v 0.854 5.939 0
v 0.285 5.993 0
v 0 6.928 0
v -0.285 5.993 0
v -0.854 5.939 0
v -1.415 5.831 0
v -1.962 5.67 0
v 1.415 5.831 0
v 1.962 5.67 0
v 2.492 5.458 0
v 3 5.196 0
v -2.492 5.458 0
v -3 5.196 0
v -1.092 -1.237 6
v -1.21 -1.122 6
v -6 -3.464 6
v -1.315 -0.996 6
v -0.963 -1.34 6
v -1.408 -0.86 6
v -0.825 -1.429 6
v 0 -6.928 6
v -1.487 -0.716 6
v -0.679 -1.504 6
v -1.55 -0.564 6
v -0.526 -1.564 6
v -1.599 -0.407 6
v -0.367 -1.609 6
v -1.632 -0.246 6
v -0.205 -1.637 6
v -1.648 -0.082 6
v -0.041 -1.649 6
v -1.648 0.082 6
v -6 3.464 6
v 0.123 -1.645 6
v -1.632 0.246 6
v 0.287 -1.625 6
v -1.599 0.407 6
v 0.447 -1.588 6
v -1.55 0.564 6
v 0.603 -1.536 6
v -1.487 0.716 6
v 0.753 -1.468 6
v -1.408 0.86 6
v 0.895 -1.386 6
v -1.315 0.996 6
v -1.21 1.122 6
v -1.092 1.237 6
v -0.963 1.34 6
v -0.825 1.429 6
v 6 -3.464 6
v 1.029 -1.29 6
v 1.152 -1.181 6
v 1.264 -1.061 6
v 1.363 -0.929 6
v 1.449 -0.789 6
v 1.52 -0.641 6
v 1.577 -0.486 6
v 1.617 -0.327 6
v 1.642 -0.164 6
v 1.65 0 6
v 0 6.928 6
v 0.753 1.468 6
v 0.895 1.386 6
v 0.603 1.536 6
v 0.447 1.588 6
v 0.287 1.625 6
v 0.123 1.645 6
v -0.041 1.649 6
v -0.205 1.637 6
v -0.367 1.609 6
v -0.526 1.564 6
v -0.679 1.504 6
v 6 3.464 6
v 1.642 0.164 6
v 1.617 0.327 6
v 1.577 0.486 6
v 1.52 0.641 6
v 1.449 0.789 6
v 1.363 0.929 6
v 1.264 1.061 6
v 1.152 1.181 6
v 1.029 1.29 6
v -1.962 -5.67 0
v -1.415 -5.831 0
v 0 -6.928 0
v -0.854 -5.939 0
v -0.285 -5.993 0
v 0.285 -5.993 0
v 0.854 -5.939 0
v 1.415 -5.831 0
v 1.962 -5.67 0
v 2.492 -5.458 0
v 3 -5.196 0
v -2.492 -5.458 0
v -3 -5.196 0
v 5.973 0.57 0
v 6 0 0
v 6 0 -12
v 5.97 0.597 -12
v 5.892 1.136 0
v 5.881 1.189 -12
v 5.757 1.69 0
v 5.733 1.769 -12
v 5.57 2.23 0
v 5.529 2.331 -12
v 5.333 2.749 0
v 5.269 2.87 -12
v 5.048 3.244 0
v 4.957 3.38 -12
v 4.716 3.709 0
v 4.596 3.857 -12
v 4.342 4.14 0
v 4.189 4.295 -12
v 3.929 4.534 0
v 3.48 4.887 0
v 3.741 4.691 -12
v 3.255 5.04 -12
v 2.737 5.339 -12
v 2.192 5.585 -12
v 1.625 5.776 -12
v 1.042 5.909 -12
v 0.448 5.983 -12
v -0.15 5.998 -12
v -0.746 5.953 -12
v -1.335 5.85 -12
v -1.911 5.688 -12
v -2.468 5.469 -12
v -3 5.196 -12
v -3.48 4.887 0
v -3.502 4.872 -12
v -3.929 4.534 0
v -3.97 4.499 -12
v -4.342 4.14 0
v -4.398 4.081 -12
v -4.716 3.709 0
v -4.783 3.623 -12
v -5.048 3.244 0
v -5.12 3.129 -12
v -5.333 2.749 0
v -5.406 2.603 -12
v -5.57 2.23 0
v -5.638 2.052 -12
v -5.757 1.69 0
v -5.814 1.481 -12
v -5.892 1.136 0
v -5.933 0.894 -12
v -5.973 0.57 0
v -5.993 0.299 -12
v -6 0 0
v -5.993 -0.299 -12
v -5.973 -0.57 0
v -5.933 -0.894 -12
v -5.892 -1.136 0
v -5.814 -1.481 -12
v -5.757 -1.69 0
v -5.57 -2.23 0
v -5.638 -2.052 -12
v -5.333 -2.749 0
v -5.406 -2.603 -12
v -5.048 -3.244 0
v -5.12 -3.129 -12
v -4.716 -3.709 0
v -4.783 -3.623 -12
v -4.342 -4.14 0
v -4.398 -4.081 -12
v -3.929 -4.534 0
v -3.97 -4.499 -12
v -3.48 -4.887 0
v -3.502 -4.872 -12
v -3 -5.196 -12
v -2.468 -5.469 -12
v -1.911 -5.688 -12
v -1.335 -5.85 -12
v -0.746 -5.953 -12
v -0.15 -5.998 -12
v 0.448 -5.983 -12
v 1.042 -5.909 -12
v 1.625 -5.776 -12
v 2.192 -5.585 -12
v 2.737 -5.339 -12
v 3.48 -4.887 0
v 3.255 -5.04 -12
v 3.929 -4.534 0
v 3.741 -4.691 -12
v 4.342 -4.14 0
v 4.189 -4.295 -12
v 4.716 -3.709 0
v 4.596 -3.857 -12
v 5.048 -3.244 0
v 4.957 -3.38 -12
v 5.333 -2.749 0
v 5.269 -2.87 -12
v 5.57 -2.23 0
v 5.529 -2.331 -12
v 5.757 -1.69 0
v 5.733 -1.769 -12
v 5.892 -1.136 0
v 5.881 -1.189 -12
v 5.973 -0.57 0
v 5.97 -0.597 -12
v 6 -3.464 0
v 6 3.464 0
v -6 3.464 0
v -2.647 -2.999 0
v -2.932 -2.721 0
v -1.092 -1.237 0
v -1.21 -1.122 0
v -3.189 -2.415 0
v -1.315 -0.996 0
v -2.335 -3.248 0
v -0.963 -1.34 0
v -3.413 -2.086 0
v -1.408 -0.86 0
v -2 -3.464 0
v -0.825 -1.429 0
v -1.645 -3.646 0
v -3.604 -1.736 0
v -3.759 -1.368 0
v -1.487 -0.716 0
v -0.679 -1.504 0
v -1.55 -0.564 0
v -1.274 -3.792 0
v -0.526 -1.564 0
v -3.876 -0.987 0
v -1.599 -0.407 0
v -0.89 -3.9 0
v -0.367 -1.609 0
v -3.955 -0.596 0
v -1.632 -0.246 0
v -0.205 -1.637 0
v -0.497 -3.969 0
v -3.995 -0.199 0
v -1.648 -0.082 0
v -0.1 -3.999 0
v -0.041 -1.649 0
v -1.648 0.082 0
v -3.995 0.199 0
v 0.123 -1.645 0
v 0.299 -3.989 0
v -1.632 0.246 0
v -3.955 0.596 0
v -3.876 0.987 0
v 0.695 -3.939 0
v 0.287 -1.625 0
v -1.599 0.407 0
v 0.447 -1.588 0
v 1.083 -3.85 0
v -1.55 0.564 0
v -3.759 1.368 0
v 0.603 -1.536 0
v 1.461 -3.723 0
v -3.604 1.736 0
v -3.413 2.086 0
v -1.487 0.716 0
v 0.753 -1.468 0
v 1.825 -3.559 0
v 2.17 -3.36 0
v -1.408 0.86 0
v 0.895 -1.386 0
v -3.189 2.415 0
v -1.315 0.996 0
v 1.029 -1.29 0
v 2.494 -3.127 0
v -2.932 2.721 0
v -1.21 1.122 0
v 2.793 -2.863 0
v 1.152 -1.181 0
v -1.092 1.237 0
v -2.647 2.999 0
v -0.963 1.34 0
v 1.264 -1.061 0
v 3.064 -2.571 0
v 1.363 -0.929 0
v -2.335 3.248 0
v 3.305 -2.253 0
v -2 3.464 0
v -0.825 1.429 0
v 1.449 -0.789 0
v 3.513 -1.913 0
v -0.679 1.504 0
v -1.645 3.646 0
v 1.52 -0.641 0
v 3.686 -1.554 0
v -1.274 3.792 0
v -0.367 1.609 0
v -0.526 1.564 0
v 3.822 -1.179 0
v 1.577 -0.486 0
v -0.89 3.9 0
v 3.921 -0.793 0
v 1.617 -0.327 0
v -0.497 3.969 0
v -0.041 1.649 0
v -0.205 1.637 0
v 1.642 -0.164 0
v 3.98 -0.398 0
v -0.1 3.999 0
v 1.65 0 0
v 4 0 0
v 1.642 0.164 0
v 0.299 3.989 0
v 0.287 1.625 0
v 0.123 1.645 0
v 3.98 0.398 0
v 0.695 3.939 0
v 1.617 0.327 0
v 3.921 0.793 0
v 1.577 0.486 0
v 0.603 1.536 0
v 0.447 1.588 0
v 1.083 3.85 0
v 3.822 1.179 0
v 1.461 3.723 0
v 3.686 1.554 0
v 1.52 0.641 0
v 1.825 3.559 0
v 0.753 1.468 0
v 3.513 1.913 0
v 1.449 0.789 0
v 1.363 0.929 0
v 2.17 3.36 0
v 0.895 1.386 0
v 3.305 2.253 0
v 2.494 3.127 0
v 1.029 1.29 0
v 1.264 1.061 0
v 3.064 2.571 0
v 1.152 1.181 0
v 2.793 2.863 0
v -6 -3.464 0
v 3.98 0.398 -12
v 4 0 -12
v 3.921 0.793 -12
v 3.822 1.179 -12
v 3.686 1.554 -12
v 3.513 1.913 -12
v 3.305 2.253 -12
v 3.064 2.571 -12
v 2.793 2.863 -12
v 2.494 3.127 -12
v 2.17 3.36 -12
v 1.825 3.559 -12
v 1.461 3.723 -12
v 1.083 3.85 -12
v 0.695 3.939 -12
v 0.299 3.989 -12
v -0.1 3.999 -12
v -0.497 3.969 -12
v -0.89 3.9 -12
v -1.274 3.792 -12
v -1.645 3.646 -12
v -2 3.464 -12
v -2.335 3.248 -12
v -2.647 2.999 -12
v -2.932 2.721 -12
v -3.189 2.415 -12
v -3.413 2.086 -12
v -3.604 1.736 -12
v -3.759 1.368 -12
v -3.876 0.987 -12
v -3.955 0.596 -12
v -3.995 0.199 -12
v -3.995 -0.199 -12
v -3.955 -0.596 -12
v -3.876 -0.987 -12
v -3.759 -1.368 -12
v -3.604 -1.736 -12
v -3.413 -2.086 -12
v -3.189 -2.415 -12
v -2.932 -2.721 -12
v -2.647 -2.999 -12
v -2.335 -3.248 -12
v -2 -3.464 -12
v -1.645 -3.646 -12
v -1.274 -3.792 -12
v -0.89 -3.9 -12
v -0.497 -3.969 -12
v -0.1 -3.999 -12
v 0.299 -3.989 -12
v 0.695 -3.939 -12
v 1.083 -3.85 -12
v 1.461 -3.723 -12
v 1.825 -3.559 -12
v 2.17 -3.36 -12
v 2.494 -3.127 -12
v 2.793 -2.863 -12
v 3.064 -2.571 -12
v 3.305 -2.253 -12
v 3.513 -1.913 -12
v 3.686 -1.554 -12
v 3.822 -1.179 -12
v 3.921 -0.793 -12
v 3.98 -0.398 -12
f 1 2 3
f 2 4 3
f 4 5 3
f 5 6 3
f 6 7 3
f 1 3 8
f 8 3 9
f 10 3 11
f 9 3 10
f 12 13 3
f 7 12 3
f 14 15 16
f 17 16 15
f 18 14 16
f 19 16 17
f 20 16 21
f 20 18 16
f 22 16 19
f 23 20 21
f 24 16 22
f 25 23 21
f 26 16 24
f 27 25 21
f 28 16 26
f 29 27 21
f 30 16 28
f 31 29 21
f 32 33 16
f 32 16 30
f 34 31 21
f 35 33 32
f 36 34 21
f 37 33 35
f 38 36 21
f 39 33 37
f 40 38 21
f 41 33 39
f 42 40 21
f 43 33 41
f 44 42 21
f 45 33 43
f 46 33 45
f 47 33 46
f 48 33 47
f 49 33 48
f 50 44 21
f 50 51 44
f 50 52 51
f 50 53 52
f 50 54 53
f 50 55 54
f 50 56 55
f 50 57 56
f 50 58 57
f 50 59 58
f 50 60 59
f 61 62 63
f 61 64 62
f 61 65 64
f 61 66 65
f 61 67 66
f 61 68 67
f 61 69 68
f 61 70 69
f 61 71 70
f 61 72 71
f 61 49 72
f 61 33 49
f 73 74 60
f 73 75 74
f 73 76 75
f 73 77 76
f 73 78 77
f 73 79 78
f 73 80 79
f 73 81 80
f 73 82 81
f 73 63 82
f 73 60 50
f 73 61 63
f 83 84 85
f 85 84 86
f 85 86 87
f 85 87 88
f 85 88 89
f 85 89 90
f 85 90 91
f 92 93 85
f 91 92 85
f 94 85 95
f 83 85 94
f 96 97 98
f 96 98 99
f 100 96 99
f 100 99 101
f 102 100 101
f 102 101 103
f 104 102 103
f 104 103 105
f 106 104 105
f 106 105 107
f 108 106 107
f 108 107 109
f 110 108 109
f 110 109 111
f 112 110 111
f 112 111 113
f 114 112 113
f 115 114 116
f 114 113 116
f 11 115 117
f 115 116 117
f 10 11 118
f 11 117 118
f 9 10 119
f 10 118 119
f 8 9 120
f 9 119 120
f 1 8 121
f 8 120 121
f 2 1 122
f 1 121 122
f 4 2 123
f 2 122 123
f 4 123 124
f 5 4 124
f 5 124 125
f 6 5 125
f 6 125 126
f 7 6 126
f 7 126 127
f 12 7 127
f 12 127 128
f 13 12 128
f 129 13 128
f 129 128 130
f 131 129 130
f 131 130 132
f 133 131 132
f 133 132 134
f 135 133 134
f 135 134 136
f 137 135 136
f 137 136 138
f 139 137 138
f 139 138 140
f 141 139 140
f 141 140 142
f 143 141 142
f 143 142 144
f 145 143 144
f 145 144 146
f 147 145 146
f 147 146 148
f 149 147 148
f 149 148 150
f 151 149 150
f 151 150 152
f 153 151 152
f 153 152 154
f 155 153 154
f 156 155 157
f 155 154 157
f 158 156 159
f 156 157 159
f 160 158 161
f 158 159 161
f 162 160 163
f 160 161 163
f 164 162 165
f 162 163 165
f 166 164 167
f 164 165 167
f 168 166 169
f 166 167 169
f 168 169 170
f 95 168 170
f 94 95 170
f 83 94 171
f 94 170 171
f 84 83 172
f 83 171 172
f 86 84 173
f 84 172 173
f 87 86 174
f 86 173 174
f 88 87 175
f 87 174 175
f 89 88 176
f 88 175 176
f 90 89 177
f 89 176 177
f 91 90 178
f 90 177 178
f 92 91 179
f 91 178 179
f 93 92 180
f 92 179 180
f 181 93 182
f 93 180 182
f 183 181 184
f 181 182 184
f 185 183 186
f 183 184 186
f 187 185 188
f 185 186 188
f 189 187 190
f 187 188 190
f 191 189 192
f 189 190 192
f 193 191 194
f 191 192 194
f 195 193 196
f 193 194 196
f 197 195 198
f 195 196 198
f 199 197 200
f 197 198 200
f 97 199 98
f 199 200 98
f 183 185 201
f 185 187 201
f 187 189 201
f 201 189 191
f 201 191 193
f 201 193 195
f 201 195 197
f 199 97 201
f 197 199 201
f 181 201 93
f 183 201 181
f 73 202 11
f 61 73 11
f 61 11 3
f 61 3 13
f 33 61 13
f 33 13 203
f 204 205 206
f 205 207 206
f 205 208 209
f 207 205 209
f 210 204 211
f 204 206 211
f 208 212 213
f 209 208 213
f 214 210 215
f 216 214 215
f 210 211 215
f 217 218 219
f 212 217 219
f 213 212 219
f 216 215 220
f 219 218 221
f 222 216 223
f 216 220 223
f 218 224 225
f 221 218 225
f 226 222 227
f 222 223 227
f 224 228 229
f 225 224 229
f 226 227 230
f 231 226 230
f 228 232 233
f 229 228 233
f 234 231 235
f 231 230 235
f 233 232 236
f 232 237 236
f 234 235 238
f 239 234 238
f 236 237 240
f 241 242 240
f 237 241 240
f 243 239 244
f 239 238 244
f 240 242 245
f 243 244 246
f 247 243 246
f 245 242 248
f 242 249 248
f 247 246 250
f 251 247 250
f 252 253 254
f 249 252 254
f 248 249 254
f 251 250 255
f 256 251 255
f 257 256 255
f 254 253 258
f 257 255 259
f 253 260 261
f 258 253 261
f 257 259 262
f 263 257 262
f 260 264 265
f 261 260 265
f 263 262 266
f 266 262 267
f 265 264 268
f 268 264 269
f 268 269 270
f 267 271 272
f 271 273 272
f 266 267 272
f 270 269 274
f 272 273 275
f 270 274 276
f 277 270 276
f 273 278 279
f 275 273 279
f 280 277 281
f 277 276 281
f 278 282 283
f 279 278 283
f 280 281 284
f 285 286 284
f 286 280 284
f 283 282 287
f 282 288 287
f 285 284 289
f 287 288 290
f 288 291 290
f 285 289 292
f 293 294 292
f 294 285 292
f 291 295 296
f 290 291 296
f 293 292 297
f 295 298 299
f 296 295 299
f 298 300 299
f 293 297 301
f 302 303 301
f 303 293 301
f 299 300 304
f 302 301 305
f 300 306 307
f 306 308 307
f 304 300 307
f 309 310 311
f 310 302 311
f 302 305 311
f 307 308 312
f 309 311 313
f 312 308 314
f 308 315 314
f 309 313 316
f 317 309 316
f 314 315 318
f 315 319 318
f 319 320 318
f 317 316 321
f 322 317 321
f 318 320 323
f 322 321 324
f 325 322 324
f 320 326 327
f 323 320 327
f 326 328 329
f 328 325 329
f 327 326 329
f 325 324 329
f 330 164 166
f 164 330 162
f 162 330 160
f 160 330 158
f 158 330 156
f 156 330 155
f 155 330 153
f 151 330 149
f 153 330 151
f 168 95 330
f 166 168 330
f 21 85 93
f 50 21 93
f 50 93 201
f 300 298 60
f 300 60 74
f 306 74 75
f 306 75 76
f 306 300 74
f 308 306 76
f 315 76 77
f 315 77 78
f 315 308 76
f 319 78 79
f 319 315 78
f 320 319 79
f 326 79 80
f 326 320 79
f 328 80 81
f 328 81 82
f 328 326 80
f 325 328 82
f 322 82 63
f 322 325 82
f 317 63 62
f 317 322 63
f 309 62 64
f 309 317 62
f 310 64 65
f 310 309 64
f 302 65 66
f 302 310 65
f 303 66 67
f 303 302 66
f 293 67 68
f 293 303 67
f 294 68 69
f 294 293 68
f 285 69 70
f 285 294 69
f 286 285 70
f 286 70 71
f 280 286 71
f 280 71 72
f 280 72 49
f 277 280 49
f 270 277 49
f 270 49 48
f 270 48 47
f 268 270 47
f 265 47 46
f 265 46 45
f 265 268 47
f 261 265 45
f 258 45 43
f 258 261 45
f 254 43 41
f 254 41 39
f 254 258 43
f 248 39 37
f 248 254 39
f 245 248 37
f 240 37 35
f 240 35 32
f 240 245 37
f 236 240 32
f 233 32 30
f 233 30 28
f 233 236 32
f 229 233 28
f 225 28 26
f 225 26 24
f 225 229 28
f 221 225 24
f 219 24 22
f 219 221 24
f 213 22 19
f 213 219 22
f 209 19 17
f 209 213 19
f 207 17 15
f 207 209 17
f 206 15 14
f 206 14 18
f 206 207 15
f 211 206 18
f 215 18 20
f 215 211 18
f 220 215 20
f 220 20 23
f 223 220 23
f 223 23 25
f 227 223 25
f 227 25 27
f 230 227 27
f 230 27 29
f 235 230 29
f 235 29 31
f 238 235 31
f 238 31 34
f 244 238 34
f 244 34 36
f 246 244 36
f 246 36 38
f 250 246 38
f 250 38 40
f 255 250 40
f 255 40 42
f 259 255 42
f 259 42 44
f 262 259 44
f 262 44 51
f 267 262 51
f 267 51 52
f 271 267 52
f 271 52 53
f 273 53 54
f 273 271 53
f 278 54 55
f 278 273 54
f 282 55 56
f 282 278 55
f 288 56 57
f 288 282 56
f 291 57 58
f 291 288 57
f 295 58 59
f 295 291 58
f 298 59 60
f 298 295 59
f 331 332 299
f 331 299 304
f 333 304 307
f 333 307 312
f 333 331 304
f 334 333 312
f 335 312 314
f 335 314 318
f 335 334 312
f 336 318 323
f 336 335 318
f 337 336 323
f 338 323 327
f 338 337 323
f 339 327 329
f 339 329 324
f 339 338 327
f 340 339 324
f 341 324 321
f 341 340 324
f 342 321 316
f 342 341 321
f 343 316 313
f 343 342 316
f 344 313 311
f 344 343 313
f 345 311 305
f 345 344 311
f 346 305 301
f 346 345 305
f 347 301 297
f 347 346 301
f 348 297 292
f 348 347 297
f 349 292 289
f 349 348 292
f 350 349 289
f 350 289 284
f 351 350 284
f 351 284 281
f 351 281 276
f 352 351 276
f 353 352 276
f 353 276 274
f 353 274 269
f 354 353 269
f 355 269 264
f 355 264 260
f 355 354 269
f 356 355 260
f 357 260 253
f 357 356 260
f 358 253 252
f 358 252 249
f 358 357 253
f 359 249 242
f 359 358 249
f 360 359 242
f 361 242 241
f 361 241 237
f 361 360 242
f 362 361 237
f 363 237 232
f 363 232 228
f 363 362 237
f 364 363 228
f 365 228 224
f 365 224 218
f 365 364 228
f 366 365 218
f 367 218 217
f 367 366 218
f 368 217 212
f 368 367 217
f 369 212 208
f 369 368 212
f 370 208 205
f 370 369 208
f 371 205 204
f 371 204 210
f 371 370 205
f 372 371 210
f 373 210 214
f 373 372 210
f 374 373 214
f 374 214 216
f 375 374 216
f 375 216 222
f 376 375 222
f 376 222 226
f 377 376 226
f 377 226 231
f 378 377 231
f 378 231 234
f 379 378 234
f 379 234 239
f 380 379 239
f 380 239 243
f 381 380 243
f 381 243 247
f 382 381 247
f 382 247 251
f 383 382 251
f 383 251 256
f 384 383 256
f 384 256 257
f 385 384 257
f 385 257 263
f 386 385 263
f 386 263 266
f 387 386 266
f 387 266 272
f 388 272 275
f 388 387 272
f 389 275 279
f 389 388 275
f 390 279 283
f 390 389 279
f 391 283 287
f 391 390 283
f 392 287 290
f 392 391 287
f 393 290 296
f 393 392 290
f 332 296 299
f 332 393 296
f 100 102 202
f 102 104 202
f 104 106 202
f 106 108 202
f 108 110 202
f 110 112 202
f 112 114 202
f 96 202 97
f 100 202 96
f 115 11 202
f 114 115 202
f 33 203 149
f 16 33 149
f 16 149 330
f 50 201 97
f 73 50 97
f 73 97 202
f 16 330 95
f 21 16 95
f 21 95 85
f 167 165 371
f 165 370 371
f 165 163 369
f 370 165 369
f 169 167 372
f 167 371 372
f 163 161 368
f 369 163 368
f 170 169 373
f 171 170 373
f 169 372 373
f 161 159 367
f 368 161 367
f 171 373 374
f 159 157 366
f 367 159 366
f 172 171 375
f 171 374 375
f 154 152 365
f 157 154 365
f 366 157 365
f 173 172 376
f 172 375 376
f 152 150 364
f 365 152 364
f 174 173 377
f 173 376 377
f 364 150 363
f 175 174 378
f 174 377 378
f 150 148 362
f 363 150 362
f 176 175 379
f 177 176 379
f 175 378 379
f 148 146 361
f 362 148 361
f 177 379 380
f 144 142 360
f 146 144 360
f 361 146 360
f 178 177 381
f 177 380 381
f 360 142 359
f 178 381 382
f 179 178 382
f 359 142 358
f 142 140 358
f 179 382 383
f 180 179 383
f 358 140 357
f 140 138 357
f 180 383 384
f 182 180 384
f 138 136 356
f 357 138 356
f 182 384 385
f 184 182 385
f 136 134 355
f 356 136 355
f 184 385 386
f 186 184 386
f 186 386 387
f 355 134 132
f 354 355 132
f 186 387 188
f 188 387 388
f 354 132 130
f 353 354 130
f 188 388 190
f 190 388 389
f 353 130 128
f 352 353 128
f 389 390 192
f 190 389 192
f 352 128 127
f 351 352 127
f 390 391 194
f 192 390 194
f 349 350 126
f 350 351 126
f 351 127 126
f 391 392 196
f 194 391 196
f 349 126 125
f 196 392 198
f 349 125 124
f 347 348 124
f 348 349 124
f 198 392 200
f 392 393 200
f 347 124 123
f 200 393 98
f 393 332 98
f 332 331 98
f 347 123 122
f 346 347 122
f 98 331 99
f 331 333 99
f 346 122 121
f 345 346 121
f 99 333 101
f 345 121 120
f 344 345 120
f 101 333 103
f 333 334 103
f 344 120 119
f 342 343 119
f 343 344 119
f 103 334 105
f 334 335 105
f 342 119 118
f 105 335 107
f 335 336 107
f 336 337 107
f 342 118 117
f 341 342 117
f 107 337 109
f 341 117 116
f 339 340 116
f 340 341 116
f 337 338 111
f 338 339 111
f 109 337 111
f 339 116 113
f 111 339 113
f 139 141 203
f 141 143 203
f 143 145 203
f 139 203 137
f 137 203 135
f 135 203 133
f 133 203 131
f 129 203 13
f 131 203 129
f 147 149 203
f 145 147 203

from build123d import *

# Parameters (mm, degrees)
SHAFT_SOCKET_START = -12
PROFILE_1_R        = 6
PROFILE_1_R_2      = 4
SHAFT_SOCKET_DEPTH = 12
PROFILE_2_R        = 1.65
DRIVE_HEX_DEPTH    = 6


with BuildPart() as part:
    # Profile_1 → Shaft_socket (new body)
    with BuildSketch(Plane.XY.offset(SHAFT_SOCKET_START)):
        Circle(PROFILE_1_R)
        Circle(PROFILE_1_R_2, mode=Mode.SUBTRACT)
    extrude(amount=SHAFT_SOCKET_DEPTH)

    # Profile_2 → Drive_hex (add)
    with BuildSketch(Plane.XY):
        Polygon((6, 3.464101615), (0, 6.92820323), (-6, 3.464101615), (-6, -3.464101615), (0, -6.92820323), (6, -3.464101615), align=None)
        Circle(PROFILE_2_R, mode=Mode.SUBTRACT)
    extrude(amount=DRIVE_HEX_DEPTH)


solid = part.part
